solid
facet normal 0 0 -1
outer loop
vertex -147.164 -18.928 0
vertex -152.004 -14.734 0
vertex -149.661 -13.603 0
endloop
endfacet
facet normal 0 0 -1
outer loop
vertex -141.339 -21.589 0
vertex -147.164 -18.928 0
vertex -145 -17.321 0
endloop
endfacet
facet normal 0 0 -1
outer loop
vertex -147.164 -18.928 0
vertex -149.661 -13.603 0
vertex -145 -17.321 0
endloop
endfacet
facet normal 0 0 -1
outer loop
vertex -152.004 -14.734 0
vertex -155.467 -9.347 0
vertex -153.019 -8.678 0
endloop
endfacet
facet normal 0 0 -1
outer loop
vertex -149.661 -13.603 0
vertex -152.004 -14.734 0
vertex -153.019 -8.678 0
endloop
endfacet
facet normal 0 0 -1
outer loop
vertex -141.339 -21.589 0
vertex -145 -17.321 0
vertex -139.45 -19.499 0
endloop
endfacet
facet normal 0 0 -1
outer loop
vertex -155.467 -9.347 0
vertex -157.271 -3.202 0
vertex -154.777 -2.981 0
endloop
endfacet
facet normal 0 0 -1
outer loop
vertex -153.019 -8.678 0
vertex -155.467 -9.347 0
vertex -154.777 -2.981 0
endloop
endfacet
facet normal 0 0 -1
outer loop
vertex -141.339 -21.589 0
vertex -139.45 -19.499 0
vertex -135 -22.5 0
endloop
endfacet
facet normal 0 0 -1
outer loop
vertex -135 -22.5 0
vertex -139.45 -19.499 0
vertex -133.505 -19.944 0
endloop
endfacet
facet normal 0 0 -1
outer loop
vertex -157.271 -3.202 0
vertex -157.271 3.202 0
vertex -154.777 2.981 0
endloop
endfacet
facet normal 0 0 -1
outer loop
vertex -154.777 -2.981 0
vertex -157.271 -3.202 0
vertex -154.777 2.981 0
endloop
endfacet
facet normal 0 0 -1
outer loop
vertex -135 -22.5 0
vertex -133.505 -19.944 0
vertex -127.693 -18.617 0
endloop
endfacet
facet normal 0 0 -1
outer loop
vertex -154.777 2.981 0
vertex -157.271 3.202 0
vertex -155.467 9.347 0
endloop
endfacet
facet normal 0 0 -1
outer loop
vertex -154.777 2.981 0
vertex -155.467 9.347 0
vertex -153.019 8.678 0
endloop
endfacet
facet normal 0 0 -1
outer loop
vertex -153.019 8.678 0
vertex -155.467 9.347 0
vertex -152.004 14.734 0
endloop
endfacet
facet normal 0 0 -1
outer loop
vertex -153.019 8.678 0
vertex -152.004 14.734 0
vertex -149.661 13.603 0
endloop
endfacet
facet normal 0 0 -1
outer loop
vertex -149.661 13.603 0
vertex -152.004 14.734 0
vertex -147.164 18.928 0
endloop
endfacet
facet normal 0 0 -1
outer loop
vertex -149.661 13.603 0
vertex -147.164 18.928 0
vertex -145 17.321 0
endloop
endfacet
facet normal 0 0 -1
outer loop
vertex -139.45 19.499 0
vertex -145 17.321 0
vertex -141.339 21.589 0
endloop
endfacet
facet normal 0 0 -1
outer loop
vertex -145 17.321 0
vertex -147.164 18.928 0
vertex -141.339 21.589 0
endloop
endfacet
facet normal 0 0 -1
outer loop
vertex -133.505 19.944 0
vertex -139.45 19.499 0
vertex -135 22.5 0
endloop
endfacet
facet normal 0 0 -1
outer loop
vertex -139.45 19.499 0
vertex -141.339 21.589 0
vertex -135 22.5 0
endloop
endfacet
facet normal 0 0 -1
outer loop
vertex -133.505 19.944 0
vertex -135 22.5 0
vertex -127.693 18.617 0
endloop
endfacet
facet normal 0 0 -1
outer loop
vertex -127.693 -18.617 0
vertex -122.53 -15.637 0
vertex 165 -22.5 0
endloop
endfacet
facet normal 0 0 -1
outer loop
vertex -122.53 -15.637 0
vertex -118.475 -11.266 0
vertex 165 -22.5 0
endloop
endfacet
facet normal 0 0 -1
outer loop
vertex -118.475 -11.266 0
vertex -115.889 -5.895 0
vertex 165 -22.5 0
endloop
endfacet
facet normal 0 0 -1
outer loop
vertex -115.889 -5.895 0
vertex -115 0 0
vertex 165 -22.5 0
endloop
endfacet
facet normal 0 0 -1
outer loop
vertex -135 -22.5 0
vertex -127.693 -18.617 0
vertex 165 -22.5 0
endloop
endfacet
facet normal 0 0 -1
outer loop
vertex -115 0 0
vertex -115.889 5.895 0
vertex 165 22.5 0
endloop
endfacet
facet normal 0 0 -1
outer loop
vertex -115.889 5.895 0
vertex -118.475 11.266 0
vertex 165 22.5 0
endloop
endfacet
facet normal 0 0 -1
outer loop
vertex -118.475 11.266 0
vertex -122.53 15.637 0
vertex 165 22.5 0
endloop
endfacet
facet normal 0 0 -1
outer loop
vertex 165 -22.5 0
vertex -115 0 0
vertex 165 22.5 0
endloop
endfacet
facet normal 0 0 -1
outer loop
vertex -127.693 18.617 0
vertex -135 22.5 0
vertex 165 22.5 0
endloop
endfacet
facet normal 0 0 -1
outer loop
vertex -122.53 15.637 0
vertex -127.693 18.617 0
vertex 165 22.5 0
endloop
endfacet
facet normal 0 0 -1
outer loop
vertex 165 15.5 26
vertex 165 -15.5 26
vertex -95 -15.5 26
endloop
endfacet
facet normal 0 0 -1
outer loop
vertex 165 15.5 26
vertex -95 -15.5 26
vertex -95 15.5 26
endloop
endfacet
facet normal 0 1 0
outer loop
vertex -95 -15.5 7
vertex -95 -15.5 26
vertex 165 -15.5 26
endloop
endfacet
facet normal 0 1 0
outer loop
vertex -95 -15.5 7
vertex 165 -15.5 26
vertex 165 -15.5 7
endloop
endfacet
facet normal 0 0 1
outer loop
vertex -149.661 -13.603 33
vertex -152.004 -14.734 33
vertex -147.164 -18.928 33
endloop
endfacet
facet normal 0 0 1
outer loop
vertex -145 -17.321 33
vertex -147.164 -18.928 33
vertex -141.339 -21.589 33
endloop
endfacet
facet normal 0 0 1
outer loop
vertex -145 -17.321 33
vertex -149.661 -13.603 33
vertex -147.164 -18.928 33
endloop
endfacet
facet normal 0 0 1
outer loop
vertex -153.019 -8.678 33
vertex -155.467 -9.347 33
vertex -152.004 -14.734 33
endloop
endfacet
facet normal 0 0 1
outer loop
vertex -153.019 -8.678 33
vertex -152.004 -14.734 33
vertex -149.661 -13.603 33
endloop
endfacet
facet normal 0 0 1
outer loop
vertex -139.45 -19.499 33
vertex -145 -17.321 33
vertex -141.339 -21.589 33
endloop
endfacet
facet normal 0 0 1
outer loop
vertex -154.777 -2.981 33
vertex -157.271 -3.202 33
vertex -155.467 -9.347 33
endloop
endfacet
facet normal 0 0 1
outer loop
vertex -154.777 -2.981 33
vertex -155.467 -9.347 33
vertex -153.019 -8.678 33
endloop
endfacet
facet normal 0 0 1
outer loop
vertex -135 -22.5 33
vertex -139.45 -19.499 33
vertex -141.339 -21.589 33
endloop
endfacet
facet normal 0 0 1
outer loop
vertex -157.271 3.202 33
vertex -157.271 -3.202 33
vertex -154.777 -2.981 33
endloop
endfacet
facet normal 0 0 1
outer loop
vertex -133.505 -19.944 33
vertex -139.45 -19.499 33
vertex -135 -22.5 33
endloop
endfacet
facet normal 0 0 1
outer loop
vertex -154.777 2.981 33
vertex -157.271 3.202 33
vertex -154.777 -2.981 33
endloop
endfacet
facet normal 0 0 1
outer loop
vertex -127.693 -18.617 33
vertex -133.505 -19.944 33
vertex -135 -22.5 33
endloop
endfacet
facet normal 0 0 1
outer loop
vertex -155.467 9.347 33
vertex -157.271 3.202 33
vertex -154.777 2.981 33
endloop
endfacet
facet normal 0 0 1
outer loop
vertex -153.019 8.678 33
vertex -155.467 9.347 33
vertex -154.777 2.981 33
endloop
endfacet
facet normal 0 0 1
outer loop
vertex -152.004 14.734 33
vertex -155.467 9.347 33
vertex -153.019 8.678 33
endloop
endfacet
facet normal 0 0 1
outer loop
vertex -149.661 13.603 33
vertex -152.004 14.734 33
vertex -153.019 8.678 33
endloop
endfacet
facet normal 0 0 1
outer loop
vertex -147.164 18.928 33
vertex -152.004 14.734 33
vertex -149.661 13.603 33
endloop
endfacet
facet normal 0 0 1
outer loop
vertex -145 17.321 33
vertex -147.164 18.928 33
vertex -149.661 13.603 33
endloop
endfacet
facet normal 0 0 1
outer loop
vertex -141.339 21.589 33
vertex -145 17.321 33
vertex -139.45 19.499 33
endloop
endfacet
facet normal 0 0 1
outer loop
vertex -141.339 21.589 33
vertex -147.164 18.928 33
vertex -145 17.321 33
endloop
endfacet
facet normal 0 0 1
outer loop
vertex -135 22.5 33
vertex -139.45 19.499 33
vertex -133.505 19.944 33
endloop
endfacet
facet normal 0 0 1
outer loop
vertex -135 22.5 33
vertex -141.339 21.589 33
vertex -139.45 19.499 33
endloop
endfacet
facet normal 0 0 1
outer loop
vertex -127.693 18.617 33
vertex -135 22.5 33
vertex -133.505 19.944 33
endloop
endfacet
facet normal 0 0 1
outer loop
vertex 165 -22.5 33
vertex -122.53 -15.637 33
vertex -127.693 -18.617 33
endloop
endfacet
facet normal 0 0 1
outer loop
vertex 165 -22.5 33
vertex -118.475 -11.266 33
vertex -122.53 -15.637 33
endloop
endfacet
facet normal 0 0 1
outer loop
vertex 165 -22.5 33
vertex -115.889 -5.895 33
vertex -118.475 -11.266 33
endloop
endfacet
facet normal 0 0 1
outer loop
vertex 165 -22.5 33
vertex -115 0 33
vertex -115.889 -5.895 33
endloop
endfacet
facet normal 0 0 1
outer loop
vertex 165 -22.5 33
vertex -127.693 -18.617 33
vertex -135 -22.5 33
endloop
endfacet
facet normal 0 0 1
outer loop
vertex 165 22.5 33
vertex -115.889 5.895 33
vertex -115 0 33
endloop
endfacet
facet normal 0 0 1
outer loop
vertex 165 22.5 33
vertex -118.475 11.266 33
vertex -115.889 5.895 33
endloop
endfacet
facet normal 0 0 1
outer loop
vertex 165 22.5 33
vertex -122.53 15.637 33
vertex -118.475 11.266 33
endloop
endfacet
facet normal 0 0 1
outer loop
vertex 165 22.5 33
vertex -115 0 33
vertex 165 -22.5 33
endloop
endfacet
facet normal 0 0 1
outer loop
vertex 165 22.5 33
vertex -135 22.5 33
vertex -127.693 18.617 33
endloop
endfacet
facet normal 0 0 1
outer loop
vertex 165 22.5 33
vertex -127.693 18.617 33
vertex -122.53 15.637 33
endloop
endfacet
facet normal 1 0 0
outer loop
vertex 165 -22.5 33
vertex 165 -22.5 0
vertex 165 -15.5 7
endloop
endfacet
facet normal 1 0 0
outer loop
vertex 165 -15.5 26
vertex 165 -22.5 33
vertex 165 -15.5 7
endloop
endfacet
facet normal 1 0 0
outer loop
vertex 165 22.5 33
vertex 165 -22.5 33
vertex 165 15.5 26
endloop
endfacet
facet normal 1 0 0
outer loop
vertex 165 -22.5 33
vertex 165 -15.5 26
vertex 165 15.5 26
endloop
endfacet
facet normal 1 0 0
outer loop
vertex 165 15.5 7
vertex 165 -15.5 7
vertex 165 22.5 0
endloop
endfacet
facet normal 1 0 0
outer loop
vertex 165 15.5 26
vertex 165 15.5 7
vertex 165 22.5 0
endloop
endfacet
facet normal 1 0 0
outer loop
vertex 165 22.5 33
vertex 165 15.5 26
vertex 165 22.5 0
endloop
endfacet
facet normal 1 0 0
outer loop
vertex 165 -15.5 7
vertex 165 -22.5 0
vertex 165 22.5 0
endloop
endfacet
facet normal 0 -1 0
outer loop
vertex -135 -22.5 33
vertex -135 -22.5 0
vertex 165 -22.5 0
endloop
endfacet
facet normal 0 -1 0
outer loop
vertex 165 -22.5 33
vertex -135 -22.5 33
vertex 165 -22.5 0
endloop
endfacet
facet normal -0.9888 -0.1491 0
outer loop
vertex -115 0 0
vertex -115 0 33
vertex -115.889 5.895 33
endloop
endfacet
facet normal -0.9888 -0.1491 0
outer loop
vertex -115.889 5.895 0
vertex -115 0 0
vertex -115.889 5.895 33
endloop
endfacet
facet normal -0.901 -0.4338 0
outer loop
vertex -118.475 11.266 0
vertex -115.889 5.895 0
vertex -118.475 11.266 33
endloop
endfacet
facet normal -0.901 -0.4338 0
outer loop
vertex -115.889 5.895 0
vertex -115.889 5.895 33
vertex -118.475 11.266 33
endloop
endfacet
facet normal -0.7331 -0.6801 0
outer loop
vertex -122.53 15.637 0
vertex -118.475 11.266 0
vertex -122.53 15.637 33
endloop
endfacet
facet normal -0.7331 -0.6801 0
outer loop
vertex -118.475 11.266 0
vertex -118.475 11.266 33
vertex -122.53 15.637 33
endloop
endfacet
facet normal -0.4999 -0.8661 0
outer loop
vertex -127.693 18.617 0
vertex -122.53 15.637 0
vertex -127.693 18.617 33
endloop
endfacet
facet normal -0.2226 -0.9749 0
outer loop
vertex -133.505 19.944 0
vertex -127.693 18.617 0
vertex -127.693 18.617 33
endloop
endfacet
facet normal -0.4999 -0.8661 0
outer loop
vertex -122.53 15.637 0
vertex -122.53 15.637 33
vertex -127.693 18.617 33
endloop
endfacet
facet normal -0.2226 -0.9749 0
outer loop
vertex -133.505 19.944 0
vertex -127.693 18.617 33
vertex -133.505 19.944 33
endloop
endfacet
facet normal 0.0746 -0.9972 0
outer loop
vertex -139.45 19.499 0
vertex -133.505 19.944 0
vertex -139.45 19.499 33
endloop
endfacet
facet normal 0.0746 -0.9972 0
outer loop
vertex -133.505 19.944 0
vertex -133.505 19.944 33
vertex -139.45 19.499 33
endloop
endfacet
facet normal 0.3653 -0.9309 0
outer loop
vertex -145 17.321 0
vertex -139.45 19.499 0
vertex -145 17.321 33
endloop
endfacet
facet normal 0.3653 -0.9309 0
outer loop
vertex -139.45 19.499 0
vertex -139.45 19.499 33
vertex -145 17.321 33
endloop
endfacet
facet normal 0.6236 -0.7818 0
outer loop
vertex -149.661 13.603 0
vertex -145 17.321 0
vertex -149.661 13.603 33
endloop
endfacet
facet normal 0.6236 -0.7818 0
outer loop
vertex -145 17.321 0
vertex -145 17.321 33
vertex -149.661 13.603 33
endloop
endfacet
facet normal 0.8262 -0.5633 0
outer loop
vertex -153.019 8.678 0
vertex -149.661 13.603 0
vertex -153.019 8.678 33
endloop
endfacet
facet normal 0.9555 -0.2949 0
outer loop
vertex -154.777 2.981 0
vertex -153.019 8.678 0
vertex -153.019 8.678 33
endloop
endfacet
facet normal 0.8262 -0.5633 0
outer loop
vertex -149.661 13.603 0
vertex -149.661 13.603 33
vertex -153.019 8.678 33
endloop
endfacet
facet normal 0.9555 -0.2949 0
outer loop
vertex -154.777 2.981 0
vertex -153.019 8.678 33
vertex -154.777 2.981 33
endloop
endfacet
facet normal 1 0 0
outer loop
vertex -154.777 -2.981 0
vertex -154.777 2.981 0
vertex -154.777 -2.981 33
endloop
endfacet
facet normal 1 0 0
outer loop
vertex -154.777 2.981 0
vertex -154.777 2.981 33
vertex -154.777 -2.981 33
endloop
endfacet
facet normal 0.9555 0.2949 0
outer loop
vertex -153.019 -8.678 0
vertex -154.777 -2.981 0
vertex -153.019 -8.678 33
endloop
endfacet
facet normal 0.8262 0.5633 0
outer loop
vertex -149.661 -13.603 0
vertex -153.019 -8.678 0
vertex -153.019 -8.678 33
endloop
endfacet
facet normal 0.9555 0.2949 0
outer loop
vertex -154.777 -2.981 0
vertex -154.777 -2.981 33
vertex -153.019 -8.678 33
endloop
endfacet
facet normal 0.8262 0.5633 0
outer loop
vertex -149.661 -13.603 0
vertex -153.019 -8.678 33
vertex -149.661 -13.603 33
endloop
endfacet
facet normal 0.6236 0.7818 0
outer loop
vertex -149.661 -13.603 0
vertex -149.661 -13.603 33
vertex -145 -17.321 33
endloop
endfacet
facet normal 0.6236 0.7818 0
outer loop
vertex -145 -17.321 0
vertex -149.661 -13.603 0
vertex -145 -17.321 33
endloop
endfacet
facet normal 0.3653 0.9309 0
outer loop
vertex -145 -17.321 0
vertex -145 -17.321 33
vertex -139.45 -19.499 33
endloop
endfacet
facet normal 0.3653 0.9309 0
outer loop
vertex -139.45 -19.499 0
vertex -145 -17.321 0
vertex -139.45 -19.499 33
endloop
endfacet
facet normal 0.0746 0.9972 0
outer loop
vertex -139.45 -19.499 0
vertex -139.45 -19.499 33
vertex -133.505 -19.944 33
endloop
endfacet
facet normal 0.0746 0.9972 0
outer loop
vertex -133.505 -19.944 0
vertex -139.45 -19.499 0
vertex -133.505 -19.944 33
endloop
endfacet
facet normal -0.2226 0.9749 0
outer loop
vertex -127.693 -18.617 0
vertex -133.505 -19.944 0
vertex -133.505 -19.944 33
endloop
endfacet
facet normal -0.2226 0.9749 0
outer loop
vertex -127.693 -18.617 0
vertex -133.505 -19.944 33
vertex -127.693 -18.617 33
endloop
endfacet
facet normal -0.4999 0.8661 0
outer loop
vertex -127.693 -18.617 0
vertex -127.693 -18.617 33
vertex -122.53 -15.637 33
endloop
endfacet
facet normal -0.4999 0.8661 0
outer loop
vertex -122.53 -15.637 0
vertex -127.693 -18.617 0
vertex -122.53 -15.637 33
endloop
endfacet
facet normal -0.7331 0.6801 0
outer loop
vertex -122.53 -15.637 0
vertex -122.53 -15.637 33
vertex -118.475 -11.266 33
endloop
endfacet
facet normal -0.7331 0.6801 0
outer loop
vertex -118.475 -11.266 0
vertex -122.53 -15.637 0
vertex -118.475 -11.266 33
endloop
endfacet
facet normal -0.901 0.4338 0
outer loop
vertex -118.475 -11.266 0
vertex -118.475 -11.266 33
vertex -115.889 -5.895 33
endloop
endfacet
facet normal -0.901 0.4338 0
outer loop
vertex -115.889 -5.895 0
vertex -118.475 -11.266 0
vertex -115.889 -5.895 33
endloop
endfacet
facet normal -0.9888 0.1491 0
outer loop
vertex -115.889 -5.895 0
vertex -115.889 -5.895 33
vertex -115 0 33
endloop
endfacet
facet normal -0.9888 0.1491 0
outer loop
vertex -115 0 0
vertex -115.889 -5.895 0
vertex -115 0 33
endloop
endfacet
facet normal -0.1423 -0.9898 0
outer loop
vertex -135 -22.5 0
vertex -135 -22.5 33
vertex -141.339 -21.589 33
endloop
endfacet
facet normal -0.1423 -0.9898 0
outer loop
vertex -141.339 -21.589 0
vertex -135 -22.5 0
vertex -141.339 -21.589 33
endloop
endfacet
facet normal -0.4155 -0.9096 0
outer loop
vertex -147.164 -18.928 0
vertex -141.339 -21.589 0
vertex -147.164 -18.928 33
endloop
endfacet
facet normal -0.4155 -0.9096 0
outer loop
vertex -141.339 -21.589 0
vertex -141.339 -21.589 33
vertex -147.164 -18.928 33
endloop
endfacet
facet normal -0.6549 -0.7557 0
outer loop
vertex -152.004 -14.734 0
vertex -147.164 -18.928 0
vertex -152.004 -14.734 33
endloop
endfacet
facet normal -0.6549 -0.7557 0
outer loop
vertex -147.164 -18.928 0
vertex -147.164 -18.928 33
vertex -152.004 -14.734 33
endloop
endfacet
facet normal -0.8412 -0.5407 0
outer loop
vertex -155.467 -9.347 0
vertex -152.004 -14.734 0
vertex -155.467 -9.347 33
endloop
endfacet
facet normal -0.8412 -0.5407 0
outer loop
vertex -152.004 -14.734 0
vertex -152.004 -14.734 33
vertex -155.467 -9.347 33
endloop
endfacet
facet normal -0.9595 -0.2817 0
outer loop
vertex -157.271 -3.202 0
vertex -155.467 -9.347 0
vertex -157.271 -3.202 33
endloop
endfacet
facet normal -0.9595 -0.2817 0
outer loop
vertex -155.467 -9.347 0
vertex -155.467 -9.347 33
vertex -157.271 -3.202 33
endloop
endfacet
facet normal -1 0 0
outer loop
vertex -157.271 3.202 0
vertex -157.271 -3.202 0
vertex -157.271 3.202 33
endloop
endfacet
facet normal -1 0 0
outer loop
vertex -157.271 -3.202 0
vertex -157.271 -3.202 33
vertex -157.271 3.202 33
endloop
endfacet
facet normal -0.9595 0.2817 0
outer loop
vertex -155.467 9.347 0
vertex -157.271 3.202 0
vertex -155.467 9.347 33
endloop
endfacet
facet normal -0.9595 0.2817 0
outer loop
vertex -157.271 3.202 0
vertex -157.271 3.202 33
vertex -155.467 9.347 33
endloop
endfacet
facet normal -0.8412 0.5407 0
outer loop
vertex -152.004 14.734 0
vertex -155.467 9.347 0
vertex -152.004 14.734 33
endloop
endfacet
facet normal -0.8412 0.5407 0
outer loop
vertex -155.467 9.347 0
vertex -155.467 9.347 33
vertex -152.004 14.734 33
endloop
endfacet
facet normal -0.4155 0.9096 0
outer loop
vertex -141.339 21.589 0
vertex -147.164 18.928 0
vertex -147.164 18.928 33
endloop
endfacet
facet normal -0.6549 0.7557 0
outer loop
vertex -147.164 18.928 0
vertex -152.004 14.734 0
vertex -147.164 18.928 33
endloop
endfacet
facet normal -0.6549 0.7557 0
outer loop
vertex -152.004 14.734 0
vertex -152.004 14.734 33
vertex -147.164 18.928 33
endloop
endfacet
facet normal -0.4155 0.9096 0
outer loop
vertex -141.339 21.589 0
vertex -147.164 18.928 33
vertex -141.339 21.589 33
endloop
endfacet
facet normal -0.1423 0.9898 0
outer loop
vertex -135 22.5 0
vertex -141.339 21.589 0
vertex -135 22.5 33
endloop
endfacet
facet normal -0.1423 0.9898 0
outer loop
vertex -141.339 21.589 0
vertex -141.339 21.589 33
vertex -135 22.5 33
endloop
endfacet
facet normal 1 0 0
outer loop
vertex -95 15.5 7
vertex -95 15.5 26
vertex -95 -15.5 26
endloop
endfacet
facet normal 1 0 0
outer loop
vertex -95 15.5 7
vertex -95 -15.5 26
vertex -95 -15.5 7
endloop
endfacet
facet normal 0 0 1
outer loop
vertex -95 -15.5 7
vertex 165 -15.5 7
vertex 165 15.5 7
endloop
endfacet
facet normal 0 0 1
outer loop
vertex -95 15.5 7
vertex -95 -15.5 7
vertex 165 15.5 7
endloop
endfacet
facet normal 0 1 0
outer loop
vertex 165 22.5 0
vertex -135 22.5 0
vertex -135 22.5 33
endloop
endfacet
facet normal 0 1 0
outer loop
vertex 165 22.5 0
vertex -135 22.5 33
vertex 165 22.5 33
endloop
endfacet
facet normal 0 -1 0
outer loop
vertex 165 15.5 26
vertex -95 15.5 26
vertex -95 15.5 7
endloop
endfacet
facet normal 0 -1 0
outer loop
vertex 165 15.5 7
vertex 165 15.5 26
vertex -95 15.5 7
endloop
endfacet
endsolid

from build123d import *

# Parameters (mm, degrees)
SKETCH1_W           = 330
SKETCH1_H           = 45
BOSS_EXTRUDE1_DEPTH = 33
SKETCH2_R           = 20
CUT_EXTRUDE1_DEPTH  = 40
SKETCH3_W           = 19
SKETCH3_H           = 31
CUT_EXTRUDE2_DEPTH  = 260


with BuildPart() as part:
    # Sketch1 → Boss-Extrude1 (new body)
    with BuildSketch(Plane.XY):
        Rectangle(SKETCH1_W, SKETCH1_H)
    extrude(amount=BOSS_EXTRUDE1_DEPTH)

    # Sketch2 → Cut-Extrude1 (cut)
    with BuildSketch(Plane.XY.offset(33)):
        with Locations((-135, 0)):
            Circle(SKETCH2_R)
        with BuildLine():
            Line((-135, 22.5), (-173.521075779, 35.069593385))
            Line((-173.521075779, 35.069593385), (-171.569663812, -40.136425611))
            Line((-171.569663812, -40.136425611), (-135, -22.5))
            ThreePointArc((-135, -22.5), (-157.5, 0), (-135, 22.5))
        make_face()
    extrude(amount=-CUT_EXTRUDE1_DEPTH, mode=Mode.SUBTRACT)

    # Sketch3 → Cut-Extrude2 (cut)
    with BuildSketch(Plane(origin=(165, 0, 0), x_dir=(0, 0, -1), z_dir=(1, 0, 0))):
        with Locations((-16.5, 0)):
            Rectangle(SKETCH3_W, SKETCH3_H)
    extrude(amount=-CUT_EXTRUDE2_DEPTH, mode=Mode.SUBTRACT)


solid = part.part
